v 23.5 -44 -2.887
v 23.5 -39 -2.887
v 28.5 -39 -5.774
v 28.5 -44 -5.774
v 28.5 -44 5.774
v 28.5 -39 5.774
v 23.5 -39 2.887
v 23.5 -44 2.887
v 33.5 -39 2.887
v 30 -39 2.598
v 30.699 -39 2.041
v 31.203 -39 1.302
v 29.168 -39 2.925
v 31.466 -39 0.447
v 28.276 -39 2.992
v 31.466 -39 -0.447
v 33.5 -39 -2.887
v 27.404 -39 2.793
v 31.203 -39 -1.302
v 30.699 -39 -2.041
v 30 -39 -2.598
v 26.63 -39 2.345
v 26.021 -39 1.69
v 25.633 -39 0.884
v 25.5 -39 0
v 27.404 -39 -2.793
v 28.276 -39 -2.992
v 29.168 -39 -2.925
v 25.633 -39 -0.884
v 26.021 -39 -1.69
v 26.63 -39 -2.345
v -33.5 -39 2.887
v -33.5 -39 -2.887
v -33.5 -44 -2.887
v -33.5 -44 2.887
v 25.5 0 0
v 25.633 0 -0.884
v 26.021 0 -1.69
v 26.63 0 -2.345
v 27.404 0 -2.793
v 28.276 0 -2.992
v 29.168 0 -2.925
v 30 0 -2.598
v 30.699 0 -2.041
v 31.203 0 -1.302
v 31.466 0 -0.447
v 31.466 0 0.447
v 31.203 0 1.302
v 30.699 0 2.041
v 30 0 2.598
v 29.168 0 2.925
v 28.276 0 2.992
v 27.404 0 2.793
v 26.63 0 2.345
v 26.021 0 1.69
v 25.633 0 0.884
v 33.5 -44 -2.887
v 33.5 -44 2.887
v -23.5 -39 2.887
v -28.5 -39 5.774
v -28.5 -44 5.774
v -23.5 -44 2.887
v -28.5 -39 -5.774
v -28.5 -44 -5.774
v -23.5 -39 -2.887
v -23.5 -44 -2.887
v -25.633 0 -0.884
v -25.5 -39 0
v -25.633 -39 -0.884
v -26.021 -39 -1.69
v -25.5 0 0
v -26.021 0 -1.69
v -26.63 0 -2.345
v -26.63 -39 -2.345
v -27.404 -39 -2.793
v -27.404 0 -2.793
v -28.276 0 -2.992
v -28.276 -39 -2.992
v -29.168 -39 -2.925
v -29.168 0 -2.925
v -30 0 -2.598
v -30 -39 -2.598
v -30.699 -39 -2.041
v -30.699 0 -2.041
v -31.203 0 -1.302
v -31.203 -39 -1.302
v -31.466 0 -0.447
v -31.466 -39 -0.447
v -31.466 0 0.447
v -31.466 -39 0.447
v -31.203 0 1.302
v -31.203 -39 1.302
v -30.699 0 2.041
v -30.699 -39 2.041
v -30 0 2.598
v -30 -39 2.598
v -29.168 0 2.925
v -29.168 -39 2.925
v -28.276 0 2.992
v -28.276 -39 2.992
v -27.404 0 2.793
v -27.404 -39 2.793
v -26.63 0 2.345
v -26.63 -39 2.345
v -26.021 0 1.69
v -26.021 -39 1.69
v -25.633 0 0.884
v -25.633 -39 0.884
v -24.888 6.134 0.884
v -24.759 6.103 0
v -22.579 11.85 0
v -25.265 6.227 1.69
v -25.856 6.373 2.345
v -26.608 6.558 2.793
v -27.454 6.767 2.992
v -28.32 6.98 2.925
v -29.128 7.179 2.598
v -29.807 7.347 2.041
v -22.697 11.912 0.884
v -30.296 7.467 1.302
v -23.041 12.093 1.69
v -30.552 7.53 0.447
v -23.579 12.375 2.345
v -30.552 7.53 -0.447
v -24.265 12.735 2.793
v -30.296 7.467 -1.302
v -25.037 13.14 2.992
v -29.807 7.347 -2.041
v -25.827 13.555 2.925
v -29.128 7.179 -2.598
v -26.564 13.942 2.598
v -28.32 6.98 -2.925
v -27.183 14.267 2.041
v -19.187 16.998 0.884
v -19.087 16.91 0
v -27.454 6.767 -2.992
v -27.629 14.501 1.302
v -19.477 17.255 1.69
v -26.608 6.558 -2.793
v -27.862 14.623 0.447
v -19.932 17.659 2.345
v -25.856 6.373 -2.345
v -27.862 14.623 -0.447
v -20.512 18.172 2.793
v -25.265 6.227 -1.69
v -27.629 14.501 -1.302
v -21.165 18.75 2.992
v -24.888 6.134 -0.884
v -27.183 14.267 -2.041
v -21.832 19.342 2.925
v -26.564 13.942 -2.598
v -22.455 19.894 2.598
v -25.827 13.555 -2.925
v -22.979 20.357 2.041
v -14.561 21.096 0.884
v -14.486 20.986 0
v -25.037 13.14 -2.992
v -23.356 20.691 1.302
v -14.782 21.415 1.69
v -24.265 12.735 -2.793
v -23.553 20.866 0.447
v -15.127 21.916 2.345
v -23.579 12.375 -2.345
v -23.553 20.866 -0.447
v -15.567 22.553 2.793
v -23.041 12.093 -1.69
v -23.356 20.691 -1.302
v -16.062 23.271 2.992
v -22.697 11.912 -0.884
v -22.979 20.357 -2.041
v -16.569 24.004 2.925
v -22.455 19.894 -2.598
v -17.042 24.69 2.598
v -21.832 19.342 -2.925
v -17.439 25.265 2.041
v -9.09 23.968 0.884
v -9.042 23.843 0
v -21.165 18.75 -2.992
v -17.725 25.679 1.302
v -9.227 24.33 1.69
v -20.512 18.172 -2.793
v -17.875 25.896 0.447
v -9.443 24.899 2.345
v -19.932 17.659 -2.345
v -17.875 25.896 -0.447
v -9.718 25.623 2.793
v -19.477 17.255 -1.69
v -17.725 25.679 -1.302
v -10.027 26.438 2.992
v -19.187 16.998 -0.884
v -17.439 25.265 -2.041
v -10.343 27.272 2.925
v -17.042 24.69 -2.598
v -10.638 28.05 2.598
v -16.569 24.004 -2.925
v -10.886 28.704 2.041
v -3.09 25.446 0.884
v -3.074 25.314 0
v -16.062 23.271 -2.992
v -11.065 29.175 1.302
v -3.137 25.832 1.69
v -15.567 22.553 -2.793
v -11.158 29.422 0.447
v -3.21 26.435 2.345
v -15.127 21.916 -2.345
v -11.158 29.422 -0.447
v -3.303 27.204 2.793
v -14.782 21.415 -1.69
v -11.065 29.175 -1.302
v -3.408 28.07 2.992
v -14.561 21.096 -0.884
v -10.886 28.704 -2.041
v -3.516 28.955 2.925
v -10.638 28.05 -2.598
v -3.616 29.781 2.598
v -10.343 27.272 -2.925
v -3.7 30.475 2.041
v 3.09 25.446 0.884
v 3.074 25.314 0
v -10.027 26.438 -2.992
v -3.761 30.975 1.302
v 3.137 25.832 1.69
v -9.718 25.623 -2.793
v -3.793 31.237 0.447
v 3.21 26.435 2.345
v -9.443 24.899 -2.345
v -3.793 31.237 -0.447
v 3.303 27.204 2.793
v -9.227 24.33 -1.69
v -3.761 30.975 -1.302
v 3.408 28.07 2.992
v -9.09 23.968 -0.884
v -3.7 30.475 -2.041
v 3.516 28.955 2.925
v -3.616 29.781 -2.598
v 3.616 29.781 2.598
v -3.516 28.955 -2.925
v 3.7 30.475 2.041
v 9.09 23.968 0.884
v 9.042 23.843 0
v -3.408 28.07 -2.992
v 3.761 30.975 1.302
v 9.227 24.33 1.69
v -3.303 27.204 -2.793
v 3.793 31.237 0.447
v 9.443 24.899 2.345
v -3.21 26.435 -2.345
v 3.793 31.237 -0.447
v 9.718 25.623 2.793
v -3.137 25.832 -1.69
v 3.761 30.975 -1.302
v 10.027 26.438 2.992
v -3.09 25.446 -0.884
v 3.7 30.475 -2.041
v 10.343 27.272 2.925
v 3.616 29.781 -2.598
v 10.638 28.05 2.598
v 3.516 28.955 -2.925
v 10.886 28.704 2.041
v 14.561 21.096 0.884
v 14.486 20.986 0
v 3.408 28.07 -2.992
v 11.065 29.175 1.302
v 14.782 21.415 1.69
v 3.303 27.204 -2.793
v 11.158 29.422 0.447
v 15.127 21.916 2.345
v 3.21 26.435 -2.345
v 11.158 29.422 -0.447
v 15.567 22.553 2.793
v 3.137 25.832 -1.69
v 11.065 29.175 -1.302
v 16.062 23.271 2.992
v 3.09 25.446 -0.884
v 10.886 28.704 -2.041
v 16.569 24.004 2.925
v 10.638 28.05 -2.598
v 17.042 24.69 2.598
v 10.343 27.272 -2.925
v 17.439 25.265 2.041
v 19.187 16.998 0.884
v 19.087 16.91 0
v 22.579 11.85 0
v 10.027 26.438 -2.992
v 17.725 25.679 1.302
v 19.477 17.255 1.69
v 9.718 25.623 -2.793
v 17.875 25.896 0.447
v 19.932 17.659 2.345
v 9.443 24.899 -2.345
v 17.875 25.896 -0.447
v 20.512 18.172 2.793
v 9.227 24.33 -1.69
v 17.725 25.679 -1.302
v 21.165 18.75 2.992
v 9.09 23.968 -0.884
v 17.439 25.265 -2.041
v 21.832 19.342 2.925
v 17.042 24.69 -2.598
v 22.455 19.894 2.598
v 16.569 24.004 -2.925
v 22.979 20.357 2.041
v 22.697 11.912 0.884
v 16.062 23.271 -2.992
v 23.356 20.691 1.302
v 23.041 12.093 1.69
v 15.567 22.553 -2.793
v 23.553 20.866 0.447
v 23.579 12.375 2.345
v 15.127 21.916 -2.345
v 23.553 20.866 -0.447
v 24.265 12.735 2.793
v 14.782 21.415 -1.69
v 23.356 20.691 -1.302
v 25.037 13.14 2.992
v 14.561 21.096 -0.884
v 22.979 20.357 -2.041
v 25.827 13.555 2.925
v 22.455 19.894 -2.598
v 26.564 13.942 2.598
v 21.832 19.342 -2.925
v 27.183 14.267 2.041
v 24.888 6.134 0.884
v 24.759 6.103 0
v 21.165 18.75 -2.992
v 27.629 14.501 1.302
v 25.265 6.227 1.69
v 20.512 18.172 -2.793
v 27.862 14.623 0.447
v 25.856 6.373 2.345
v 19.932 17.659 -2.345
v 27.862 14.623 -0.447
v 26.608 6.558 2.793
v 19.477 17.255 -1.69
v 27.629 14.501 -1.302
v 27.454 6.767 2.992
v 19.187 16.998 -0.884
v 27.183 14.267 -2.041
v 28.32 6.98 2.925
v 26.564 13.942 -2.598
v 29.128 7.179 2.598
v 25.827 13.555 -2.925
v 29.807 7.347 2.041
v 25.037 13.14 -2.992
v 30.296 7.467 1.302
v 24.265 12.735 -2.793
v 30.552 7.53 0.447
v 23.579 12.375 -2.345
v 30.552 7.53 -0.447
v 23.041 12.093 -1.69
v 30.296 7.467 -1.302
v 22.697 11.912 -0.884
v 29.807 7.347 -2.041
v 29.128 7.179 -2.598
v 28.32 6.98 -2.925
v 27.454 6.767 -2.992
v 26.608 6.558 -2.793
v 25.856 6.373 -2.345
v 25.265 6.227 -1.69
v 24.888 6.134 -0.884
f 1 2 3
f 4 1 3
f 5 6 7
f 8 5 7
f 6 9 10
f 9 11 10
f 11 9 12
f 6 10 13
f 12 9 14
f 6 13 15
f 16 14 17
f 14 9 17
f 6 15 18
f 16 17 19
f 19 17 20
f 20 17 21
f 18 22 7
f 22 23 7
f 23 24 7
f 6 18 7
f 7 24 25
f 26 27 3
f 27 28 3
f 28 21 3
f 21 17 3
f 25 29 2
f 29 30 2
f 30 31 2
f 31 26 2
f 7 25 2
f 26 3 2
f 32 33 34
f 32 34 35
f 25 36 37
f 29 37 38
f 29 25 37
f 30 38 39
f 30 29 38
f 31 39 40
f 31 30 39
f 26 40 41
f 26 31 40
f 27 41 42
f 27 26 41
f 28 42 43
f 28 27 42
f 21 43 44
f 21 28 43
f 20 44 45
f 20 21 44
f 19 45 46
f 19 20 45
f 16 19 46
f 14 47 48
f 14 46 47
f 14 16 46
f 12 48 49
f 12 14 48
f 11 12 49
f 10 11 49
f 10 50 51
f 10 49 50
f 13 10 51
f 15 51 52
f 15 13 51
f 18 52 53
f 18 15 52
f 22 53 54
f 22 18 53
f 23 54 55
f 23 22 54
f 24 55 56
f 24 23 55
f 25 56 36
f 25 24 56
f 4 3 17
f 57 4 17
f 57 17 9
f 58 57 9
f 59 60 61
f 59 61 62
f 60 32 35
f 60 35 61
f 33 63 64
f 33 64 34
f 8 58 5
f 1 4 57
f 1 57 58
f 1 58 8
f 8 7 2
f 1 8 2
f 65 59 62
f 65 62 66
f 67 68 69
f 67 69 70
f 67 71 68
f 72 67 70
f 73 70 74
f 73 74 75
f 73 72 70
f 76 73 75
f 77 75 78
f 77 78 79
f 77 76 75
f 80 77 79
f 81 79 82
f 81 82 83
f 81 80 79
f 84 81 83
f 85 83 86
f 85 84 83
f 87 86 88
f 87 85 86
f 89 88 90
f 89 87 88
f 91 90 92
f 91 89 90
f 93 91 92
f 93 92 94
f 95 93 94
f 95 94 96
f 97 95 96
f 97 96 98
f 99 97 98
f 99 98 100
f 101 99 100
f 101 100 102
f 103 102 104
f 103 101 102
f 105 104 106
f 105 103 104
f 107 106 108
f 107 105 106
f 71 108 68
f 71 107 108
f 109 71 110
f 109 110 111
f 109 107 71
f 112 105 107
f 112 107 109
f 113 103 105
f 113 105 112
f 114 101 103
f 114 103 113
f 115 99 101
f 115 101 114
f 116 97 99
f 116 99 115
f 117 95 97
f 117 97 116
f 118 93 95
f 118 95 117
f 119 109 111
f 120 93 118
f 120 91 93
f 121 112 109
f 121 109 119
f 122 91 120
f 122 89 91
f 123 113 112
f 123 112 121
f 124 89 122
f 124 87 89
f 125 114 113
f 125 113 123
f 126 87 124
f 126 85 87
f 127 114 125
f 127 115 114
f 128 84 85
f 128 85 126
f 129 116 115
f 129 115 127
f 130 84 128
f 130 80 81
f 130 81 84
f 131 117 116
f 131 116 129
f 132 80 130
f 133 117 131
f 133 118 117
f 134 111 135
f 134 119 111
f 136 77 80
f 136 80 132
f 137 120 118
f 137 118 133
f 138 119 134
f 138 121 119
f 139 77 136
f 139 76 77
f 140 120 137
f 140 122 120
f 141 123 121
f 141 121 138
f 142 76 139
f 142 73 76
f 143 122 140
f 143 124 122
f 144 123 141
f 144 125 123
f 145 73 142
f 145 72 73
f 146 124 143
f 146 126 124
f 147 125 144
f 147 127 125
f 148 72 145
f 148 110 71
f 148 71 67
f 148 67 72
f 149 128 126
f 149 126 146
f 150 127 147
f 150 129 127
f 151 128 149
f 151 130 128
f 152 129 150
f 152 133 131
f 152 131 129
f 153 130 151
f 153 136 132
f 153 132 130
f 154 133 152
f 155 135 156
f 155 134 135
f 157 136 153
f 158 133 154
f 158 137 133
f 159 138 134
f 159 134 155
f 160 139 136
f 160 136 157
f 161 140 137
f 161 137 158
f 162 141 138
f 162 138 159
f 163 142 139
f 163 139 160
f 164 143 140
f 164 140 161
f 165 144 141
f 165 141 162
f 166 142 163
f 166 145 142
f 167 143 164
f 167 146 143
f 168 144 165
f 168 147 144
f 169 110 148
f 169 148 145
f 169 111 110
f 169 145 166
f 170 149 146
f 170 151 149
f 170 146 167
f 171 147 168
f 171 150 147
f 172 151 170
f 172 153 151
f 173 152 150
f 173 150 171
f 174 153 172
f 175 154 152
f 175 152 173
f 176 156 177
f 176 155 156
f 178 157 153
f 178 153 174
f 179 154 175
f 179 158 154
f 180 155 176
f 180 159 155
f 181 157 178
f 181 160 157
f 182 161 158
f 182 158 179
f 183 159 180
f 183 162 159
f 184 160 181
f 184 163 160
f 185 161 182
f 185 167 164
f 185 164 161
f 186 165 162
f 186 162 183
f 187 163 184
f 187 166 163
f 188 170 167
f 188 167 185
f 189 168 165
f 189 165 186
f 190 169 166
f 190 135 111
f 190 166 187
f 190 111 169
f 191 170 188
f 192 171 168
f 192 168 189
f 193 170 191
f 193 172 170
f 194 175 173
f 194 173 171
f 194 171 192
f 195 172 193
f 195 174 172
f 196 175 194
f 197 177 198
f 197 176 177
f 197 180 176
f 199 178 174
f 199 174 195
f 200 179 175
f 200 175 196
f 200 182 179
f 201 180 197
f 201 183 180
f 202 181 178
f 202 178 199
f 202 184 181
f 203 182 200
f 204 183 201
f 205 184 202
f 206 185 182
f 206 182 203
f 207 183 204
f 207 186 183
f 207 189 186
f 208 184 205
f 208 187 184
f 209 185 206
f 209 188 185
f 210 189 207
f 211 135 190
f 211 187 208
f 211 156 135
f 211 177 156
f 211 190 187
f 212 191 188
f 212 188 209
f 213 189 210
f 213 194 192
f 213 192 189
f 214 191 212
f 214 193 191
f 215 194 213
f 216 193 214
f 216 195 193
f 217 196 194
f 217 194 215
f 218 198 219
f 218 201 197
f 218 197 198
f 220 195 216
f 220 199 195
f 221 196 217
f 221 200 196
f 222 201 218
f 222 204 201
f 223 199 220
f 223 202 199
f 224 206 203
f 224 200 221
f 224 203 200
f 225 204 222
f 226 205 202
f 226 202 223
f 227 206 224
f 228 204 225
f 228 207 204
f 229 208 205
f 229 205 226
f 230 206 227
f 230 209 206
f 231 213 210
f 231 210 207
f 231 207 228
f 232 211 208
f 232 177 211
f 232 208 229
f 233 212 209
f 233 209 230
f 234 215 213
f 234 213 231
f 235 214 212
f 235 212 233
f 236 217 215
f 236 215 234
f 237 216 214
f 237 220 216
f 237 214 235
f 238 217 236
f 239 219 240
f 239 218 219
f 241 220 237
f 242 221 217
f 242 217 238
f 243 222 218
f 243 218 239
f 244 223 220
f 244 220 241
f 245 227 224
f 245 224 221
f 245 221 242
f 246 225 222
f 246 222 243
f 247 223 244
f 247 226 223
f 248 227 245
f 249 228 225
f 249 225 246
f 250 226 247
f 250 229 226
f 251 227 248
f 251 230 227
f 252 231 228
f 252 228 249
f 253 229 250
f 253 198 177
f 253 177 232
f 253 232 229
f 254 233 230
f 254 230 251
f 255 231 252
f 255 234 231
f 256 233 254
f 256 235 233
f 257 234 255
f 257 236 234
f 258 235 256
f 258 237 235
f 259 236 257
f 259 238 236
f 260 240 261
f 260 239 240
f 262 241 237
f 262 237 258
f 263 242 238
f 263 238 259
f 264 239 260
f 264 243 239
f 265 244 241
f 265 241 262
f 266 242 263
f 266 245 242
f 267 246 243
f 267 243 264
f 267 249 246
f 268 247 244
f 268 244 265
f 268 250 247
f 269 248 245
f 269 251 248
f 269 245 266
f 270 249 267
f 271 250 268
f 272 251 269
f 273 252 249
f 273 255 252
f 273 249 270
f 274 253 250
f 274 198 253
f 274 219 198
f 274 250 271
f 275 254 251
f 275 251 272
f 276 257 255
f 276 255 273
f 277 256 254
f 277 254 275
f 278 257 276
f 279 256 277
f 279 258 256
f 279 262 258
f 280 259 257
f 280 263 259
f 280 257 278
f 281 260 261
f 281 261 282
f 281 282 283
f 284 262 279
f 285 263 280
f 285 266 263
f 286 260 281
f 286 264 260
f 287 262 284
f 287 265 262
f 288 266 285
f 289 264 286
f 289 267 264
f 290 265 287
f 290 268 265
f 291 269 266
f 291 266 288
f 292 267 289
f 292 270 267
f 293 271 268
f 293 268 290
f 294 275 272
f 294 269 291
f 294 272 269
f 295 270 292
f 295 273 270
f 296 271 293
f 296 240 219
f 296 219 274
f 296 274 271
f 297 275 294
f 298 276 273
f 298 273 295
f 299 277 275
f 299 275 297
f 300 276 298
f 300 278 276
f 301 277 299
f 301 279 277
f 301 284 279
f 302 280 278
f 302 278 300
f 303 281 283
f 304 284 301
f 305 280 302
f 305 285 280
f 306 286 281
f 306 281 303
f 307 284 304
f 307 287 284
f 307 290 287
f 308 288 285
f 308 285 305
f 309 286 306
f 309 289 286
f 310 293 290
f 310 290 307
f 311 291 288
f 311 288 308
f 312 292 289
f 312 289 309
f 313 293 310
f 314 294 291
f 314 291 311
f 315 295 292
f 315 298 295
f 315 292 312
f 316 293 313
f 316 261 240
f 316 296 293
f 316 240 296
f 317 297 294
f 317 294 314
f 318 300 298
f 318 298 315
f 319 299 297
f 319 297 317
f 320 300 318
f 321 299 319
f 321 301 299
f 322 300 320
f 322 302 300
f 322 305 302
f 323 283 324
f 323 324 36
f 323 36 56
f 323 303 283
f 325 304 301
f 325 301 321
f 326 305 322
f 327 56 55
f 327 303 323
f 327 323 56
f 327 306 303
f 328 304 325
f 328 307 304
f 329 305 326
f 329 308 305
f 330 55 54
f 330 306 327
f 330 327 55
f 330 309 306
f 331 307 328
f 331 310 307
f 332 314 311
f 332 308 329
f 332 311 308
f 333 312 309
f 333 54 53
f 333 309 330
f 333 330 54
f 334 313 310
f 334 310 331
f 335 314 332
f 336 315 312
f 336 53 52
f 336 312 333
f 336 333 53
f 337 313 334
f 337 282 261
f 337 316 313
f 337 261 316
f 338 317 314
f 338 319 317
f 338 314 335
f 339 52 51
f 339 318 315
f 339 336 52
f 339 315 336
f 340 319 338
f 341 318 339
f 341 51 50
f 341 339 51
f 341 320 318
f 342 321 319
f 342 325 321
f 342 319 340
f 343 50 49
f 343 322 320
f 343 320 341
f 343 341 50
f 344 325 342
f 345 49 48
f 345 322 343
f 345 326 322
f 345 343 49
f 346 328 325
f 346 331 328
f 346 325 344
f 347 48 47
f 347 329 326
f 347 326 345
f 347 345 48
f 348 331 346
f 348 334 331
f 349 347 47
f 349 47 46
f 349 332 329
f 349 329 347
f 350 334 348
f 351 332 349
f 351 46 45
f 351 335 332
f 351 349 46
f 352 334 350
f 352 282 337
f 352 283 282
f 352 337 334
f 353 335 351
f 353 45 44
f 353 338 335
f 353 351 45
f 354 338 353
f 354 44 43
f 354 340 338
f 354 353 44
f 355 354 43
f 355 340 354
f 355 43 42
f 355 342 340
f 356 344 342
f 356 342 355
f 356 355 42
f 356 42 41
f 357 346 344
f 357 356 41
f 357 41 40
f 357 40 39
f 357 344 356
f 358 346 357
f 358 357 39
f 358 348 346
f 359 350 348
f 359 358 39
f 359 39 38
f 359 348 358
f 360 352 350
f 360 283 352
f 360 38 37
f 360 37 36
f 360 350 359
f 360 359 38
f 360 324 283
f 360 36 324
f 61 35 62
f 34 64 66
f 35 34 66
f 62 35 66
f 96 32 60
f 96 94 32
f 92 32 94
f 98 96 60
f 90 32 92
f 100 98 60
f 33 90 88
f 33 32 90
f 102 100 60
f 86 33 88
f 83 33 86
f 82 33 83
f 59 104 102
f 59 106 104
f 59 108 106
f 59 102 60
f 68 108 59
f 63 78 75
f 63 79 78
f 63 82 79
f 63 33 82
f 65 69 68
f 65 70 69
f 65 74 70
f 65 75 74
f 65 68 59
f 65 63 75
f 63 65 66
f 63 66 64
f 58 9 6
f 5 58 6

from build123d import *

# Parameters (mm, degrees)
SWEEP1_PROFILE_R    = 3
BOSS_EXTRUDE1_DEPTH = 5


with BuildPart() as part:
    # Sweep1: sweep along a path in Sketch1
    with BuildLine(Plane.XY) as sweep1_path:
        Line((-28.5, -42.5), (-28.5, 0))
        ThreePointArc((-28.5, 0), (0, 28.5), (28.5, 0))
        Line((28.5, 0), (28.5, -42.5))
    # Sweep1 profile (on start of the path) → Sweep1 (sweep)
    with BuildSketch(Plane(origin=(-28.5, -42.5, 0), x_dir=(1, 0, 0), z_dir=(0, 1, 0))):
        Circle(SWEEP1_PROFILE_R)
    sweep(path=sweep1_path.line)

    # Sketch14 → Boss-Extrude1 (add)
    with BuildSketch(Plane(origin=(0, -39, 0), x_dir=(1, 0, 0), z_dir=(0, 1, 0))):
        Polygon((-28.5, 5.773502692), (-33.5, 2.886751346), (-33.5, -2.886751346), (-28.5, -5.773502692), (-23.5, -2.886751346), (-23.5, 2.886751346), align=None)
        Polygon((23.5, 2.886751346), (28.5, 5.773502692), (33.5, 2.886751346), (33.5, -2.886751346), (28.5, -5.773502692), (23.5, -2.886751346), align=None)
    extrude(amount=-BOSS_EXTRUDE1_DEPTH)


solid = part.part
